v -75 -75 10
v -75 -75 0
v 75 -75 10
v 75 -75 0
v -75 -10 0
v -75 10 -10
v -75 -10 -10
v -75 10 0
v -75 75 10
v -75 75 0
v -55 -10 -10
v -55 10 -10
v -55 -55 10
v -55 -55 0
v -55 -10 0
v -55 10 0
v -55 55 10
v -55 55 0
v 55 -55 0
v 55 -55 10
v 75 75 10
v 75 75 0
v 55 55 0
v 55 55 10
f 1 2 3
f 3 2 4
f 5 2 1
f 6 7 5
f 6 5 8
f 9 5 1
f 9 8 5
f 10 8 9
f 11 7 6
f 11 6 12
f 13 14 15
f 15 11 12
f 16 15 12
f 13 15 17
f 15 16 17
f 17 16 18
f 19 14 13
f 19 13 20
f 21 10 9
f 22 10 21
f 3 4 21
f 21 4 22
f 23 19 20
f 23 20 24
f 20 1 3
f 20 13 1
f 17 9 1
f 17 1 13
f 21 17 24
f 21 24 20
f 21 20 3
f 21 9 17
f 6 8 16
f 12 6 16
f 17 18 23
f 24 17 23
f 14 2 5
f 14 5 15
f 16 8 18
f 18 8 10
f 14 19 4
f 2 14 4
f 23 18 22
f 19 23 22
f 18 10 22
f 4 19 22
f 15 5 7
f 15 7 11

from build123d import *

# Parameters (mm, degrees)
SKETCH_W     = 150
SKETCH_H     = 150
SKETCH_W_2   = 110
SKETCH_H_2   = 110
PAD_DEPTH    = 10
SKETCH003_W  = 20
SKETCH003_H  = 20
PAD001_DEPTH = 10


with BuildPart() as part:
    # Sketch → Pad (new body)
    with BuildSketch(Plane.XY):
        Rectangle(SKETCH_W, SKETCH_H)
        Rectangle(SKETCH_W_2, SKETCH_H_2, mode=Mode.SUBTRACT)
    extrude(amount=PAD_DEPTH)

    # Sketch003 → Pad001 (new body)
    with BuildSketch(Plane(origin=(0, 0, 0), x_dir=(1, 0, 0), z_dir=(0, 0, -1))):
        with Locations((-65, 0)):
            Rectangle(SKETCH003_W, SKETCH003_H)
    extrude(amount=PAD001_DEPTH)


solid = part.part
